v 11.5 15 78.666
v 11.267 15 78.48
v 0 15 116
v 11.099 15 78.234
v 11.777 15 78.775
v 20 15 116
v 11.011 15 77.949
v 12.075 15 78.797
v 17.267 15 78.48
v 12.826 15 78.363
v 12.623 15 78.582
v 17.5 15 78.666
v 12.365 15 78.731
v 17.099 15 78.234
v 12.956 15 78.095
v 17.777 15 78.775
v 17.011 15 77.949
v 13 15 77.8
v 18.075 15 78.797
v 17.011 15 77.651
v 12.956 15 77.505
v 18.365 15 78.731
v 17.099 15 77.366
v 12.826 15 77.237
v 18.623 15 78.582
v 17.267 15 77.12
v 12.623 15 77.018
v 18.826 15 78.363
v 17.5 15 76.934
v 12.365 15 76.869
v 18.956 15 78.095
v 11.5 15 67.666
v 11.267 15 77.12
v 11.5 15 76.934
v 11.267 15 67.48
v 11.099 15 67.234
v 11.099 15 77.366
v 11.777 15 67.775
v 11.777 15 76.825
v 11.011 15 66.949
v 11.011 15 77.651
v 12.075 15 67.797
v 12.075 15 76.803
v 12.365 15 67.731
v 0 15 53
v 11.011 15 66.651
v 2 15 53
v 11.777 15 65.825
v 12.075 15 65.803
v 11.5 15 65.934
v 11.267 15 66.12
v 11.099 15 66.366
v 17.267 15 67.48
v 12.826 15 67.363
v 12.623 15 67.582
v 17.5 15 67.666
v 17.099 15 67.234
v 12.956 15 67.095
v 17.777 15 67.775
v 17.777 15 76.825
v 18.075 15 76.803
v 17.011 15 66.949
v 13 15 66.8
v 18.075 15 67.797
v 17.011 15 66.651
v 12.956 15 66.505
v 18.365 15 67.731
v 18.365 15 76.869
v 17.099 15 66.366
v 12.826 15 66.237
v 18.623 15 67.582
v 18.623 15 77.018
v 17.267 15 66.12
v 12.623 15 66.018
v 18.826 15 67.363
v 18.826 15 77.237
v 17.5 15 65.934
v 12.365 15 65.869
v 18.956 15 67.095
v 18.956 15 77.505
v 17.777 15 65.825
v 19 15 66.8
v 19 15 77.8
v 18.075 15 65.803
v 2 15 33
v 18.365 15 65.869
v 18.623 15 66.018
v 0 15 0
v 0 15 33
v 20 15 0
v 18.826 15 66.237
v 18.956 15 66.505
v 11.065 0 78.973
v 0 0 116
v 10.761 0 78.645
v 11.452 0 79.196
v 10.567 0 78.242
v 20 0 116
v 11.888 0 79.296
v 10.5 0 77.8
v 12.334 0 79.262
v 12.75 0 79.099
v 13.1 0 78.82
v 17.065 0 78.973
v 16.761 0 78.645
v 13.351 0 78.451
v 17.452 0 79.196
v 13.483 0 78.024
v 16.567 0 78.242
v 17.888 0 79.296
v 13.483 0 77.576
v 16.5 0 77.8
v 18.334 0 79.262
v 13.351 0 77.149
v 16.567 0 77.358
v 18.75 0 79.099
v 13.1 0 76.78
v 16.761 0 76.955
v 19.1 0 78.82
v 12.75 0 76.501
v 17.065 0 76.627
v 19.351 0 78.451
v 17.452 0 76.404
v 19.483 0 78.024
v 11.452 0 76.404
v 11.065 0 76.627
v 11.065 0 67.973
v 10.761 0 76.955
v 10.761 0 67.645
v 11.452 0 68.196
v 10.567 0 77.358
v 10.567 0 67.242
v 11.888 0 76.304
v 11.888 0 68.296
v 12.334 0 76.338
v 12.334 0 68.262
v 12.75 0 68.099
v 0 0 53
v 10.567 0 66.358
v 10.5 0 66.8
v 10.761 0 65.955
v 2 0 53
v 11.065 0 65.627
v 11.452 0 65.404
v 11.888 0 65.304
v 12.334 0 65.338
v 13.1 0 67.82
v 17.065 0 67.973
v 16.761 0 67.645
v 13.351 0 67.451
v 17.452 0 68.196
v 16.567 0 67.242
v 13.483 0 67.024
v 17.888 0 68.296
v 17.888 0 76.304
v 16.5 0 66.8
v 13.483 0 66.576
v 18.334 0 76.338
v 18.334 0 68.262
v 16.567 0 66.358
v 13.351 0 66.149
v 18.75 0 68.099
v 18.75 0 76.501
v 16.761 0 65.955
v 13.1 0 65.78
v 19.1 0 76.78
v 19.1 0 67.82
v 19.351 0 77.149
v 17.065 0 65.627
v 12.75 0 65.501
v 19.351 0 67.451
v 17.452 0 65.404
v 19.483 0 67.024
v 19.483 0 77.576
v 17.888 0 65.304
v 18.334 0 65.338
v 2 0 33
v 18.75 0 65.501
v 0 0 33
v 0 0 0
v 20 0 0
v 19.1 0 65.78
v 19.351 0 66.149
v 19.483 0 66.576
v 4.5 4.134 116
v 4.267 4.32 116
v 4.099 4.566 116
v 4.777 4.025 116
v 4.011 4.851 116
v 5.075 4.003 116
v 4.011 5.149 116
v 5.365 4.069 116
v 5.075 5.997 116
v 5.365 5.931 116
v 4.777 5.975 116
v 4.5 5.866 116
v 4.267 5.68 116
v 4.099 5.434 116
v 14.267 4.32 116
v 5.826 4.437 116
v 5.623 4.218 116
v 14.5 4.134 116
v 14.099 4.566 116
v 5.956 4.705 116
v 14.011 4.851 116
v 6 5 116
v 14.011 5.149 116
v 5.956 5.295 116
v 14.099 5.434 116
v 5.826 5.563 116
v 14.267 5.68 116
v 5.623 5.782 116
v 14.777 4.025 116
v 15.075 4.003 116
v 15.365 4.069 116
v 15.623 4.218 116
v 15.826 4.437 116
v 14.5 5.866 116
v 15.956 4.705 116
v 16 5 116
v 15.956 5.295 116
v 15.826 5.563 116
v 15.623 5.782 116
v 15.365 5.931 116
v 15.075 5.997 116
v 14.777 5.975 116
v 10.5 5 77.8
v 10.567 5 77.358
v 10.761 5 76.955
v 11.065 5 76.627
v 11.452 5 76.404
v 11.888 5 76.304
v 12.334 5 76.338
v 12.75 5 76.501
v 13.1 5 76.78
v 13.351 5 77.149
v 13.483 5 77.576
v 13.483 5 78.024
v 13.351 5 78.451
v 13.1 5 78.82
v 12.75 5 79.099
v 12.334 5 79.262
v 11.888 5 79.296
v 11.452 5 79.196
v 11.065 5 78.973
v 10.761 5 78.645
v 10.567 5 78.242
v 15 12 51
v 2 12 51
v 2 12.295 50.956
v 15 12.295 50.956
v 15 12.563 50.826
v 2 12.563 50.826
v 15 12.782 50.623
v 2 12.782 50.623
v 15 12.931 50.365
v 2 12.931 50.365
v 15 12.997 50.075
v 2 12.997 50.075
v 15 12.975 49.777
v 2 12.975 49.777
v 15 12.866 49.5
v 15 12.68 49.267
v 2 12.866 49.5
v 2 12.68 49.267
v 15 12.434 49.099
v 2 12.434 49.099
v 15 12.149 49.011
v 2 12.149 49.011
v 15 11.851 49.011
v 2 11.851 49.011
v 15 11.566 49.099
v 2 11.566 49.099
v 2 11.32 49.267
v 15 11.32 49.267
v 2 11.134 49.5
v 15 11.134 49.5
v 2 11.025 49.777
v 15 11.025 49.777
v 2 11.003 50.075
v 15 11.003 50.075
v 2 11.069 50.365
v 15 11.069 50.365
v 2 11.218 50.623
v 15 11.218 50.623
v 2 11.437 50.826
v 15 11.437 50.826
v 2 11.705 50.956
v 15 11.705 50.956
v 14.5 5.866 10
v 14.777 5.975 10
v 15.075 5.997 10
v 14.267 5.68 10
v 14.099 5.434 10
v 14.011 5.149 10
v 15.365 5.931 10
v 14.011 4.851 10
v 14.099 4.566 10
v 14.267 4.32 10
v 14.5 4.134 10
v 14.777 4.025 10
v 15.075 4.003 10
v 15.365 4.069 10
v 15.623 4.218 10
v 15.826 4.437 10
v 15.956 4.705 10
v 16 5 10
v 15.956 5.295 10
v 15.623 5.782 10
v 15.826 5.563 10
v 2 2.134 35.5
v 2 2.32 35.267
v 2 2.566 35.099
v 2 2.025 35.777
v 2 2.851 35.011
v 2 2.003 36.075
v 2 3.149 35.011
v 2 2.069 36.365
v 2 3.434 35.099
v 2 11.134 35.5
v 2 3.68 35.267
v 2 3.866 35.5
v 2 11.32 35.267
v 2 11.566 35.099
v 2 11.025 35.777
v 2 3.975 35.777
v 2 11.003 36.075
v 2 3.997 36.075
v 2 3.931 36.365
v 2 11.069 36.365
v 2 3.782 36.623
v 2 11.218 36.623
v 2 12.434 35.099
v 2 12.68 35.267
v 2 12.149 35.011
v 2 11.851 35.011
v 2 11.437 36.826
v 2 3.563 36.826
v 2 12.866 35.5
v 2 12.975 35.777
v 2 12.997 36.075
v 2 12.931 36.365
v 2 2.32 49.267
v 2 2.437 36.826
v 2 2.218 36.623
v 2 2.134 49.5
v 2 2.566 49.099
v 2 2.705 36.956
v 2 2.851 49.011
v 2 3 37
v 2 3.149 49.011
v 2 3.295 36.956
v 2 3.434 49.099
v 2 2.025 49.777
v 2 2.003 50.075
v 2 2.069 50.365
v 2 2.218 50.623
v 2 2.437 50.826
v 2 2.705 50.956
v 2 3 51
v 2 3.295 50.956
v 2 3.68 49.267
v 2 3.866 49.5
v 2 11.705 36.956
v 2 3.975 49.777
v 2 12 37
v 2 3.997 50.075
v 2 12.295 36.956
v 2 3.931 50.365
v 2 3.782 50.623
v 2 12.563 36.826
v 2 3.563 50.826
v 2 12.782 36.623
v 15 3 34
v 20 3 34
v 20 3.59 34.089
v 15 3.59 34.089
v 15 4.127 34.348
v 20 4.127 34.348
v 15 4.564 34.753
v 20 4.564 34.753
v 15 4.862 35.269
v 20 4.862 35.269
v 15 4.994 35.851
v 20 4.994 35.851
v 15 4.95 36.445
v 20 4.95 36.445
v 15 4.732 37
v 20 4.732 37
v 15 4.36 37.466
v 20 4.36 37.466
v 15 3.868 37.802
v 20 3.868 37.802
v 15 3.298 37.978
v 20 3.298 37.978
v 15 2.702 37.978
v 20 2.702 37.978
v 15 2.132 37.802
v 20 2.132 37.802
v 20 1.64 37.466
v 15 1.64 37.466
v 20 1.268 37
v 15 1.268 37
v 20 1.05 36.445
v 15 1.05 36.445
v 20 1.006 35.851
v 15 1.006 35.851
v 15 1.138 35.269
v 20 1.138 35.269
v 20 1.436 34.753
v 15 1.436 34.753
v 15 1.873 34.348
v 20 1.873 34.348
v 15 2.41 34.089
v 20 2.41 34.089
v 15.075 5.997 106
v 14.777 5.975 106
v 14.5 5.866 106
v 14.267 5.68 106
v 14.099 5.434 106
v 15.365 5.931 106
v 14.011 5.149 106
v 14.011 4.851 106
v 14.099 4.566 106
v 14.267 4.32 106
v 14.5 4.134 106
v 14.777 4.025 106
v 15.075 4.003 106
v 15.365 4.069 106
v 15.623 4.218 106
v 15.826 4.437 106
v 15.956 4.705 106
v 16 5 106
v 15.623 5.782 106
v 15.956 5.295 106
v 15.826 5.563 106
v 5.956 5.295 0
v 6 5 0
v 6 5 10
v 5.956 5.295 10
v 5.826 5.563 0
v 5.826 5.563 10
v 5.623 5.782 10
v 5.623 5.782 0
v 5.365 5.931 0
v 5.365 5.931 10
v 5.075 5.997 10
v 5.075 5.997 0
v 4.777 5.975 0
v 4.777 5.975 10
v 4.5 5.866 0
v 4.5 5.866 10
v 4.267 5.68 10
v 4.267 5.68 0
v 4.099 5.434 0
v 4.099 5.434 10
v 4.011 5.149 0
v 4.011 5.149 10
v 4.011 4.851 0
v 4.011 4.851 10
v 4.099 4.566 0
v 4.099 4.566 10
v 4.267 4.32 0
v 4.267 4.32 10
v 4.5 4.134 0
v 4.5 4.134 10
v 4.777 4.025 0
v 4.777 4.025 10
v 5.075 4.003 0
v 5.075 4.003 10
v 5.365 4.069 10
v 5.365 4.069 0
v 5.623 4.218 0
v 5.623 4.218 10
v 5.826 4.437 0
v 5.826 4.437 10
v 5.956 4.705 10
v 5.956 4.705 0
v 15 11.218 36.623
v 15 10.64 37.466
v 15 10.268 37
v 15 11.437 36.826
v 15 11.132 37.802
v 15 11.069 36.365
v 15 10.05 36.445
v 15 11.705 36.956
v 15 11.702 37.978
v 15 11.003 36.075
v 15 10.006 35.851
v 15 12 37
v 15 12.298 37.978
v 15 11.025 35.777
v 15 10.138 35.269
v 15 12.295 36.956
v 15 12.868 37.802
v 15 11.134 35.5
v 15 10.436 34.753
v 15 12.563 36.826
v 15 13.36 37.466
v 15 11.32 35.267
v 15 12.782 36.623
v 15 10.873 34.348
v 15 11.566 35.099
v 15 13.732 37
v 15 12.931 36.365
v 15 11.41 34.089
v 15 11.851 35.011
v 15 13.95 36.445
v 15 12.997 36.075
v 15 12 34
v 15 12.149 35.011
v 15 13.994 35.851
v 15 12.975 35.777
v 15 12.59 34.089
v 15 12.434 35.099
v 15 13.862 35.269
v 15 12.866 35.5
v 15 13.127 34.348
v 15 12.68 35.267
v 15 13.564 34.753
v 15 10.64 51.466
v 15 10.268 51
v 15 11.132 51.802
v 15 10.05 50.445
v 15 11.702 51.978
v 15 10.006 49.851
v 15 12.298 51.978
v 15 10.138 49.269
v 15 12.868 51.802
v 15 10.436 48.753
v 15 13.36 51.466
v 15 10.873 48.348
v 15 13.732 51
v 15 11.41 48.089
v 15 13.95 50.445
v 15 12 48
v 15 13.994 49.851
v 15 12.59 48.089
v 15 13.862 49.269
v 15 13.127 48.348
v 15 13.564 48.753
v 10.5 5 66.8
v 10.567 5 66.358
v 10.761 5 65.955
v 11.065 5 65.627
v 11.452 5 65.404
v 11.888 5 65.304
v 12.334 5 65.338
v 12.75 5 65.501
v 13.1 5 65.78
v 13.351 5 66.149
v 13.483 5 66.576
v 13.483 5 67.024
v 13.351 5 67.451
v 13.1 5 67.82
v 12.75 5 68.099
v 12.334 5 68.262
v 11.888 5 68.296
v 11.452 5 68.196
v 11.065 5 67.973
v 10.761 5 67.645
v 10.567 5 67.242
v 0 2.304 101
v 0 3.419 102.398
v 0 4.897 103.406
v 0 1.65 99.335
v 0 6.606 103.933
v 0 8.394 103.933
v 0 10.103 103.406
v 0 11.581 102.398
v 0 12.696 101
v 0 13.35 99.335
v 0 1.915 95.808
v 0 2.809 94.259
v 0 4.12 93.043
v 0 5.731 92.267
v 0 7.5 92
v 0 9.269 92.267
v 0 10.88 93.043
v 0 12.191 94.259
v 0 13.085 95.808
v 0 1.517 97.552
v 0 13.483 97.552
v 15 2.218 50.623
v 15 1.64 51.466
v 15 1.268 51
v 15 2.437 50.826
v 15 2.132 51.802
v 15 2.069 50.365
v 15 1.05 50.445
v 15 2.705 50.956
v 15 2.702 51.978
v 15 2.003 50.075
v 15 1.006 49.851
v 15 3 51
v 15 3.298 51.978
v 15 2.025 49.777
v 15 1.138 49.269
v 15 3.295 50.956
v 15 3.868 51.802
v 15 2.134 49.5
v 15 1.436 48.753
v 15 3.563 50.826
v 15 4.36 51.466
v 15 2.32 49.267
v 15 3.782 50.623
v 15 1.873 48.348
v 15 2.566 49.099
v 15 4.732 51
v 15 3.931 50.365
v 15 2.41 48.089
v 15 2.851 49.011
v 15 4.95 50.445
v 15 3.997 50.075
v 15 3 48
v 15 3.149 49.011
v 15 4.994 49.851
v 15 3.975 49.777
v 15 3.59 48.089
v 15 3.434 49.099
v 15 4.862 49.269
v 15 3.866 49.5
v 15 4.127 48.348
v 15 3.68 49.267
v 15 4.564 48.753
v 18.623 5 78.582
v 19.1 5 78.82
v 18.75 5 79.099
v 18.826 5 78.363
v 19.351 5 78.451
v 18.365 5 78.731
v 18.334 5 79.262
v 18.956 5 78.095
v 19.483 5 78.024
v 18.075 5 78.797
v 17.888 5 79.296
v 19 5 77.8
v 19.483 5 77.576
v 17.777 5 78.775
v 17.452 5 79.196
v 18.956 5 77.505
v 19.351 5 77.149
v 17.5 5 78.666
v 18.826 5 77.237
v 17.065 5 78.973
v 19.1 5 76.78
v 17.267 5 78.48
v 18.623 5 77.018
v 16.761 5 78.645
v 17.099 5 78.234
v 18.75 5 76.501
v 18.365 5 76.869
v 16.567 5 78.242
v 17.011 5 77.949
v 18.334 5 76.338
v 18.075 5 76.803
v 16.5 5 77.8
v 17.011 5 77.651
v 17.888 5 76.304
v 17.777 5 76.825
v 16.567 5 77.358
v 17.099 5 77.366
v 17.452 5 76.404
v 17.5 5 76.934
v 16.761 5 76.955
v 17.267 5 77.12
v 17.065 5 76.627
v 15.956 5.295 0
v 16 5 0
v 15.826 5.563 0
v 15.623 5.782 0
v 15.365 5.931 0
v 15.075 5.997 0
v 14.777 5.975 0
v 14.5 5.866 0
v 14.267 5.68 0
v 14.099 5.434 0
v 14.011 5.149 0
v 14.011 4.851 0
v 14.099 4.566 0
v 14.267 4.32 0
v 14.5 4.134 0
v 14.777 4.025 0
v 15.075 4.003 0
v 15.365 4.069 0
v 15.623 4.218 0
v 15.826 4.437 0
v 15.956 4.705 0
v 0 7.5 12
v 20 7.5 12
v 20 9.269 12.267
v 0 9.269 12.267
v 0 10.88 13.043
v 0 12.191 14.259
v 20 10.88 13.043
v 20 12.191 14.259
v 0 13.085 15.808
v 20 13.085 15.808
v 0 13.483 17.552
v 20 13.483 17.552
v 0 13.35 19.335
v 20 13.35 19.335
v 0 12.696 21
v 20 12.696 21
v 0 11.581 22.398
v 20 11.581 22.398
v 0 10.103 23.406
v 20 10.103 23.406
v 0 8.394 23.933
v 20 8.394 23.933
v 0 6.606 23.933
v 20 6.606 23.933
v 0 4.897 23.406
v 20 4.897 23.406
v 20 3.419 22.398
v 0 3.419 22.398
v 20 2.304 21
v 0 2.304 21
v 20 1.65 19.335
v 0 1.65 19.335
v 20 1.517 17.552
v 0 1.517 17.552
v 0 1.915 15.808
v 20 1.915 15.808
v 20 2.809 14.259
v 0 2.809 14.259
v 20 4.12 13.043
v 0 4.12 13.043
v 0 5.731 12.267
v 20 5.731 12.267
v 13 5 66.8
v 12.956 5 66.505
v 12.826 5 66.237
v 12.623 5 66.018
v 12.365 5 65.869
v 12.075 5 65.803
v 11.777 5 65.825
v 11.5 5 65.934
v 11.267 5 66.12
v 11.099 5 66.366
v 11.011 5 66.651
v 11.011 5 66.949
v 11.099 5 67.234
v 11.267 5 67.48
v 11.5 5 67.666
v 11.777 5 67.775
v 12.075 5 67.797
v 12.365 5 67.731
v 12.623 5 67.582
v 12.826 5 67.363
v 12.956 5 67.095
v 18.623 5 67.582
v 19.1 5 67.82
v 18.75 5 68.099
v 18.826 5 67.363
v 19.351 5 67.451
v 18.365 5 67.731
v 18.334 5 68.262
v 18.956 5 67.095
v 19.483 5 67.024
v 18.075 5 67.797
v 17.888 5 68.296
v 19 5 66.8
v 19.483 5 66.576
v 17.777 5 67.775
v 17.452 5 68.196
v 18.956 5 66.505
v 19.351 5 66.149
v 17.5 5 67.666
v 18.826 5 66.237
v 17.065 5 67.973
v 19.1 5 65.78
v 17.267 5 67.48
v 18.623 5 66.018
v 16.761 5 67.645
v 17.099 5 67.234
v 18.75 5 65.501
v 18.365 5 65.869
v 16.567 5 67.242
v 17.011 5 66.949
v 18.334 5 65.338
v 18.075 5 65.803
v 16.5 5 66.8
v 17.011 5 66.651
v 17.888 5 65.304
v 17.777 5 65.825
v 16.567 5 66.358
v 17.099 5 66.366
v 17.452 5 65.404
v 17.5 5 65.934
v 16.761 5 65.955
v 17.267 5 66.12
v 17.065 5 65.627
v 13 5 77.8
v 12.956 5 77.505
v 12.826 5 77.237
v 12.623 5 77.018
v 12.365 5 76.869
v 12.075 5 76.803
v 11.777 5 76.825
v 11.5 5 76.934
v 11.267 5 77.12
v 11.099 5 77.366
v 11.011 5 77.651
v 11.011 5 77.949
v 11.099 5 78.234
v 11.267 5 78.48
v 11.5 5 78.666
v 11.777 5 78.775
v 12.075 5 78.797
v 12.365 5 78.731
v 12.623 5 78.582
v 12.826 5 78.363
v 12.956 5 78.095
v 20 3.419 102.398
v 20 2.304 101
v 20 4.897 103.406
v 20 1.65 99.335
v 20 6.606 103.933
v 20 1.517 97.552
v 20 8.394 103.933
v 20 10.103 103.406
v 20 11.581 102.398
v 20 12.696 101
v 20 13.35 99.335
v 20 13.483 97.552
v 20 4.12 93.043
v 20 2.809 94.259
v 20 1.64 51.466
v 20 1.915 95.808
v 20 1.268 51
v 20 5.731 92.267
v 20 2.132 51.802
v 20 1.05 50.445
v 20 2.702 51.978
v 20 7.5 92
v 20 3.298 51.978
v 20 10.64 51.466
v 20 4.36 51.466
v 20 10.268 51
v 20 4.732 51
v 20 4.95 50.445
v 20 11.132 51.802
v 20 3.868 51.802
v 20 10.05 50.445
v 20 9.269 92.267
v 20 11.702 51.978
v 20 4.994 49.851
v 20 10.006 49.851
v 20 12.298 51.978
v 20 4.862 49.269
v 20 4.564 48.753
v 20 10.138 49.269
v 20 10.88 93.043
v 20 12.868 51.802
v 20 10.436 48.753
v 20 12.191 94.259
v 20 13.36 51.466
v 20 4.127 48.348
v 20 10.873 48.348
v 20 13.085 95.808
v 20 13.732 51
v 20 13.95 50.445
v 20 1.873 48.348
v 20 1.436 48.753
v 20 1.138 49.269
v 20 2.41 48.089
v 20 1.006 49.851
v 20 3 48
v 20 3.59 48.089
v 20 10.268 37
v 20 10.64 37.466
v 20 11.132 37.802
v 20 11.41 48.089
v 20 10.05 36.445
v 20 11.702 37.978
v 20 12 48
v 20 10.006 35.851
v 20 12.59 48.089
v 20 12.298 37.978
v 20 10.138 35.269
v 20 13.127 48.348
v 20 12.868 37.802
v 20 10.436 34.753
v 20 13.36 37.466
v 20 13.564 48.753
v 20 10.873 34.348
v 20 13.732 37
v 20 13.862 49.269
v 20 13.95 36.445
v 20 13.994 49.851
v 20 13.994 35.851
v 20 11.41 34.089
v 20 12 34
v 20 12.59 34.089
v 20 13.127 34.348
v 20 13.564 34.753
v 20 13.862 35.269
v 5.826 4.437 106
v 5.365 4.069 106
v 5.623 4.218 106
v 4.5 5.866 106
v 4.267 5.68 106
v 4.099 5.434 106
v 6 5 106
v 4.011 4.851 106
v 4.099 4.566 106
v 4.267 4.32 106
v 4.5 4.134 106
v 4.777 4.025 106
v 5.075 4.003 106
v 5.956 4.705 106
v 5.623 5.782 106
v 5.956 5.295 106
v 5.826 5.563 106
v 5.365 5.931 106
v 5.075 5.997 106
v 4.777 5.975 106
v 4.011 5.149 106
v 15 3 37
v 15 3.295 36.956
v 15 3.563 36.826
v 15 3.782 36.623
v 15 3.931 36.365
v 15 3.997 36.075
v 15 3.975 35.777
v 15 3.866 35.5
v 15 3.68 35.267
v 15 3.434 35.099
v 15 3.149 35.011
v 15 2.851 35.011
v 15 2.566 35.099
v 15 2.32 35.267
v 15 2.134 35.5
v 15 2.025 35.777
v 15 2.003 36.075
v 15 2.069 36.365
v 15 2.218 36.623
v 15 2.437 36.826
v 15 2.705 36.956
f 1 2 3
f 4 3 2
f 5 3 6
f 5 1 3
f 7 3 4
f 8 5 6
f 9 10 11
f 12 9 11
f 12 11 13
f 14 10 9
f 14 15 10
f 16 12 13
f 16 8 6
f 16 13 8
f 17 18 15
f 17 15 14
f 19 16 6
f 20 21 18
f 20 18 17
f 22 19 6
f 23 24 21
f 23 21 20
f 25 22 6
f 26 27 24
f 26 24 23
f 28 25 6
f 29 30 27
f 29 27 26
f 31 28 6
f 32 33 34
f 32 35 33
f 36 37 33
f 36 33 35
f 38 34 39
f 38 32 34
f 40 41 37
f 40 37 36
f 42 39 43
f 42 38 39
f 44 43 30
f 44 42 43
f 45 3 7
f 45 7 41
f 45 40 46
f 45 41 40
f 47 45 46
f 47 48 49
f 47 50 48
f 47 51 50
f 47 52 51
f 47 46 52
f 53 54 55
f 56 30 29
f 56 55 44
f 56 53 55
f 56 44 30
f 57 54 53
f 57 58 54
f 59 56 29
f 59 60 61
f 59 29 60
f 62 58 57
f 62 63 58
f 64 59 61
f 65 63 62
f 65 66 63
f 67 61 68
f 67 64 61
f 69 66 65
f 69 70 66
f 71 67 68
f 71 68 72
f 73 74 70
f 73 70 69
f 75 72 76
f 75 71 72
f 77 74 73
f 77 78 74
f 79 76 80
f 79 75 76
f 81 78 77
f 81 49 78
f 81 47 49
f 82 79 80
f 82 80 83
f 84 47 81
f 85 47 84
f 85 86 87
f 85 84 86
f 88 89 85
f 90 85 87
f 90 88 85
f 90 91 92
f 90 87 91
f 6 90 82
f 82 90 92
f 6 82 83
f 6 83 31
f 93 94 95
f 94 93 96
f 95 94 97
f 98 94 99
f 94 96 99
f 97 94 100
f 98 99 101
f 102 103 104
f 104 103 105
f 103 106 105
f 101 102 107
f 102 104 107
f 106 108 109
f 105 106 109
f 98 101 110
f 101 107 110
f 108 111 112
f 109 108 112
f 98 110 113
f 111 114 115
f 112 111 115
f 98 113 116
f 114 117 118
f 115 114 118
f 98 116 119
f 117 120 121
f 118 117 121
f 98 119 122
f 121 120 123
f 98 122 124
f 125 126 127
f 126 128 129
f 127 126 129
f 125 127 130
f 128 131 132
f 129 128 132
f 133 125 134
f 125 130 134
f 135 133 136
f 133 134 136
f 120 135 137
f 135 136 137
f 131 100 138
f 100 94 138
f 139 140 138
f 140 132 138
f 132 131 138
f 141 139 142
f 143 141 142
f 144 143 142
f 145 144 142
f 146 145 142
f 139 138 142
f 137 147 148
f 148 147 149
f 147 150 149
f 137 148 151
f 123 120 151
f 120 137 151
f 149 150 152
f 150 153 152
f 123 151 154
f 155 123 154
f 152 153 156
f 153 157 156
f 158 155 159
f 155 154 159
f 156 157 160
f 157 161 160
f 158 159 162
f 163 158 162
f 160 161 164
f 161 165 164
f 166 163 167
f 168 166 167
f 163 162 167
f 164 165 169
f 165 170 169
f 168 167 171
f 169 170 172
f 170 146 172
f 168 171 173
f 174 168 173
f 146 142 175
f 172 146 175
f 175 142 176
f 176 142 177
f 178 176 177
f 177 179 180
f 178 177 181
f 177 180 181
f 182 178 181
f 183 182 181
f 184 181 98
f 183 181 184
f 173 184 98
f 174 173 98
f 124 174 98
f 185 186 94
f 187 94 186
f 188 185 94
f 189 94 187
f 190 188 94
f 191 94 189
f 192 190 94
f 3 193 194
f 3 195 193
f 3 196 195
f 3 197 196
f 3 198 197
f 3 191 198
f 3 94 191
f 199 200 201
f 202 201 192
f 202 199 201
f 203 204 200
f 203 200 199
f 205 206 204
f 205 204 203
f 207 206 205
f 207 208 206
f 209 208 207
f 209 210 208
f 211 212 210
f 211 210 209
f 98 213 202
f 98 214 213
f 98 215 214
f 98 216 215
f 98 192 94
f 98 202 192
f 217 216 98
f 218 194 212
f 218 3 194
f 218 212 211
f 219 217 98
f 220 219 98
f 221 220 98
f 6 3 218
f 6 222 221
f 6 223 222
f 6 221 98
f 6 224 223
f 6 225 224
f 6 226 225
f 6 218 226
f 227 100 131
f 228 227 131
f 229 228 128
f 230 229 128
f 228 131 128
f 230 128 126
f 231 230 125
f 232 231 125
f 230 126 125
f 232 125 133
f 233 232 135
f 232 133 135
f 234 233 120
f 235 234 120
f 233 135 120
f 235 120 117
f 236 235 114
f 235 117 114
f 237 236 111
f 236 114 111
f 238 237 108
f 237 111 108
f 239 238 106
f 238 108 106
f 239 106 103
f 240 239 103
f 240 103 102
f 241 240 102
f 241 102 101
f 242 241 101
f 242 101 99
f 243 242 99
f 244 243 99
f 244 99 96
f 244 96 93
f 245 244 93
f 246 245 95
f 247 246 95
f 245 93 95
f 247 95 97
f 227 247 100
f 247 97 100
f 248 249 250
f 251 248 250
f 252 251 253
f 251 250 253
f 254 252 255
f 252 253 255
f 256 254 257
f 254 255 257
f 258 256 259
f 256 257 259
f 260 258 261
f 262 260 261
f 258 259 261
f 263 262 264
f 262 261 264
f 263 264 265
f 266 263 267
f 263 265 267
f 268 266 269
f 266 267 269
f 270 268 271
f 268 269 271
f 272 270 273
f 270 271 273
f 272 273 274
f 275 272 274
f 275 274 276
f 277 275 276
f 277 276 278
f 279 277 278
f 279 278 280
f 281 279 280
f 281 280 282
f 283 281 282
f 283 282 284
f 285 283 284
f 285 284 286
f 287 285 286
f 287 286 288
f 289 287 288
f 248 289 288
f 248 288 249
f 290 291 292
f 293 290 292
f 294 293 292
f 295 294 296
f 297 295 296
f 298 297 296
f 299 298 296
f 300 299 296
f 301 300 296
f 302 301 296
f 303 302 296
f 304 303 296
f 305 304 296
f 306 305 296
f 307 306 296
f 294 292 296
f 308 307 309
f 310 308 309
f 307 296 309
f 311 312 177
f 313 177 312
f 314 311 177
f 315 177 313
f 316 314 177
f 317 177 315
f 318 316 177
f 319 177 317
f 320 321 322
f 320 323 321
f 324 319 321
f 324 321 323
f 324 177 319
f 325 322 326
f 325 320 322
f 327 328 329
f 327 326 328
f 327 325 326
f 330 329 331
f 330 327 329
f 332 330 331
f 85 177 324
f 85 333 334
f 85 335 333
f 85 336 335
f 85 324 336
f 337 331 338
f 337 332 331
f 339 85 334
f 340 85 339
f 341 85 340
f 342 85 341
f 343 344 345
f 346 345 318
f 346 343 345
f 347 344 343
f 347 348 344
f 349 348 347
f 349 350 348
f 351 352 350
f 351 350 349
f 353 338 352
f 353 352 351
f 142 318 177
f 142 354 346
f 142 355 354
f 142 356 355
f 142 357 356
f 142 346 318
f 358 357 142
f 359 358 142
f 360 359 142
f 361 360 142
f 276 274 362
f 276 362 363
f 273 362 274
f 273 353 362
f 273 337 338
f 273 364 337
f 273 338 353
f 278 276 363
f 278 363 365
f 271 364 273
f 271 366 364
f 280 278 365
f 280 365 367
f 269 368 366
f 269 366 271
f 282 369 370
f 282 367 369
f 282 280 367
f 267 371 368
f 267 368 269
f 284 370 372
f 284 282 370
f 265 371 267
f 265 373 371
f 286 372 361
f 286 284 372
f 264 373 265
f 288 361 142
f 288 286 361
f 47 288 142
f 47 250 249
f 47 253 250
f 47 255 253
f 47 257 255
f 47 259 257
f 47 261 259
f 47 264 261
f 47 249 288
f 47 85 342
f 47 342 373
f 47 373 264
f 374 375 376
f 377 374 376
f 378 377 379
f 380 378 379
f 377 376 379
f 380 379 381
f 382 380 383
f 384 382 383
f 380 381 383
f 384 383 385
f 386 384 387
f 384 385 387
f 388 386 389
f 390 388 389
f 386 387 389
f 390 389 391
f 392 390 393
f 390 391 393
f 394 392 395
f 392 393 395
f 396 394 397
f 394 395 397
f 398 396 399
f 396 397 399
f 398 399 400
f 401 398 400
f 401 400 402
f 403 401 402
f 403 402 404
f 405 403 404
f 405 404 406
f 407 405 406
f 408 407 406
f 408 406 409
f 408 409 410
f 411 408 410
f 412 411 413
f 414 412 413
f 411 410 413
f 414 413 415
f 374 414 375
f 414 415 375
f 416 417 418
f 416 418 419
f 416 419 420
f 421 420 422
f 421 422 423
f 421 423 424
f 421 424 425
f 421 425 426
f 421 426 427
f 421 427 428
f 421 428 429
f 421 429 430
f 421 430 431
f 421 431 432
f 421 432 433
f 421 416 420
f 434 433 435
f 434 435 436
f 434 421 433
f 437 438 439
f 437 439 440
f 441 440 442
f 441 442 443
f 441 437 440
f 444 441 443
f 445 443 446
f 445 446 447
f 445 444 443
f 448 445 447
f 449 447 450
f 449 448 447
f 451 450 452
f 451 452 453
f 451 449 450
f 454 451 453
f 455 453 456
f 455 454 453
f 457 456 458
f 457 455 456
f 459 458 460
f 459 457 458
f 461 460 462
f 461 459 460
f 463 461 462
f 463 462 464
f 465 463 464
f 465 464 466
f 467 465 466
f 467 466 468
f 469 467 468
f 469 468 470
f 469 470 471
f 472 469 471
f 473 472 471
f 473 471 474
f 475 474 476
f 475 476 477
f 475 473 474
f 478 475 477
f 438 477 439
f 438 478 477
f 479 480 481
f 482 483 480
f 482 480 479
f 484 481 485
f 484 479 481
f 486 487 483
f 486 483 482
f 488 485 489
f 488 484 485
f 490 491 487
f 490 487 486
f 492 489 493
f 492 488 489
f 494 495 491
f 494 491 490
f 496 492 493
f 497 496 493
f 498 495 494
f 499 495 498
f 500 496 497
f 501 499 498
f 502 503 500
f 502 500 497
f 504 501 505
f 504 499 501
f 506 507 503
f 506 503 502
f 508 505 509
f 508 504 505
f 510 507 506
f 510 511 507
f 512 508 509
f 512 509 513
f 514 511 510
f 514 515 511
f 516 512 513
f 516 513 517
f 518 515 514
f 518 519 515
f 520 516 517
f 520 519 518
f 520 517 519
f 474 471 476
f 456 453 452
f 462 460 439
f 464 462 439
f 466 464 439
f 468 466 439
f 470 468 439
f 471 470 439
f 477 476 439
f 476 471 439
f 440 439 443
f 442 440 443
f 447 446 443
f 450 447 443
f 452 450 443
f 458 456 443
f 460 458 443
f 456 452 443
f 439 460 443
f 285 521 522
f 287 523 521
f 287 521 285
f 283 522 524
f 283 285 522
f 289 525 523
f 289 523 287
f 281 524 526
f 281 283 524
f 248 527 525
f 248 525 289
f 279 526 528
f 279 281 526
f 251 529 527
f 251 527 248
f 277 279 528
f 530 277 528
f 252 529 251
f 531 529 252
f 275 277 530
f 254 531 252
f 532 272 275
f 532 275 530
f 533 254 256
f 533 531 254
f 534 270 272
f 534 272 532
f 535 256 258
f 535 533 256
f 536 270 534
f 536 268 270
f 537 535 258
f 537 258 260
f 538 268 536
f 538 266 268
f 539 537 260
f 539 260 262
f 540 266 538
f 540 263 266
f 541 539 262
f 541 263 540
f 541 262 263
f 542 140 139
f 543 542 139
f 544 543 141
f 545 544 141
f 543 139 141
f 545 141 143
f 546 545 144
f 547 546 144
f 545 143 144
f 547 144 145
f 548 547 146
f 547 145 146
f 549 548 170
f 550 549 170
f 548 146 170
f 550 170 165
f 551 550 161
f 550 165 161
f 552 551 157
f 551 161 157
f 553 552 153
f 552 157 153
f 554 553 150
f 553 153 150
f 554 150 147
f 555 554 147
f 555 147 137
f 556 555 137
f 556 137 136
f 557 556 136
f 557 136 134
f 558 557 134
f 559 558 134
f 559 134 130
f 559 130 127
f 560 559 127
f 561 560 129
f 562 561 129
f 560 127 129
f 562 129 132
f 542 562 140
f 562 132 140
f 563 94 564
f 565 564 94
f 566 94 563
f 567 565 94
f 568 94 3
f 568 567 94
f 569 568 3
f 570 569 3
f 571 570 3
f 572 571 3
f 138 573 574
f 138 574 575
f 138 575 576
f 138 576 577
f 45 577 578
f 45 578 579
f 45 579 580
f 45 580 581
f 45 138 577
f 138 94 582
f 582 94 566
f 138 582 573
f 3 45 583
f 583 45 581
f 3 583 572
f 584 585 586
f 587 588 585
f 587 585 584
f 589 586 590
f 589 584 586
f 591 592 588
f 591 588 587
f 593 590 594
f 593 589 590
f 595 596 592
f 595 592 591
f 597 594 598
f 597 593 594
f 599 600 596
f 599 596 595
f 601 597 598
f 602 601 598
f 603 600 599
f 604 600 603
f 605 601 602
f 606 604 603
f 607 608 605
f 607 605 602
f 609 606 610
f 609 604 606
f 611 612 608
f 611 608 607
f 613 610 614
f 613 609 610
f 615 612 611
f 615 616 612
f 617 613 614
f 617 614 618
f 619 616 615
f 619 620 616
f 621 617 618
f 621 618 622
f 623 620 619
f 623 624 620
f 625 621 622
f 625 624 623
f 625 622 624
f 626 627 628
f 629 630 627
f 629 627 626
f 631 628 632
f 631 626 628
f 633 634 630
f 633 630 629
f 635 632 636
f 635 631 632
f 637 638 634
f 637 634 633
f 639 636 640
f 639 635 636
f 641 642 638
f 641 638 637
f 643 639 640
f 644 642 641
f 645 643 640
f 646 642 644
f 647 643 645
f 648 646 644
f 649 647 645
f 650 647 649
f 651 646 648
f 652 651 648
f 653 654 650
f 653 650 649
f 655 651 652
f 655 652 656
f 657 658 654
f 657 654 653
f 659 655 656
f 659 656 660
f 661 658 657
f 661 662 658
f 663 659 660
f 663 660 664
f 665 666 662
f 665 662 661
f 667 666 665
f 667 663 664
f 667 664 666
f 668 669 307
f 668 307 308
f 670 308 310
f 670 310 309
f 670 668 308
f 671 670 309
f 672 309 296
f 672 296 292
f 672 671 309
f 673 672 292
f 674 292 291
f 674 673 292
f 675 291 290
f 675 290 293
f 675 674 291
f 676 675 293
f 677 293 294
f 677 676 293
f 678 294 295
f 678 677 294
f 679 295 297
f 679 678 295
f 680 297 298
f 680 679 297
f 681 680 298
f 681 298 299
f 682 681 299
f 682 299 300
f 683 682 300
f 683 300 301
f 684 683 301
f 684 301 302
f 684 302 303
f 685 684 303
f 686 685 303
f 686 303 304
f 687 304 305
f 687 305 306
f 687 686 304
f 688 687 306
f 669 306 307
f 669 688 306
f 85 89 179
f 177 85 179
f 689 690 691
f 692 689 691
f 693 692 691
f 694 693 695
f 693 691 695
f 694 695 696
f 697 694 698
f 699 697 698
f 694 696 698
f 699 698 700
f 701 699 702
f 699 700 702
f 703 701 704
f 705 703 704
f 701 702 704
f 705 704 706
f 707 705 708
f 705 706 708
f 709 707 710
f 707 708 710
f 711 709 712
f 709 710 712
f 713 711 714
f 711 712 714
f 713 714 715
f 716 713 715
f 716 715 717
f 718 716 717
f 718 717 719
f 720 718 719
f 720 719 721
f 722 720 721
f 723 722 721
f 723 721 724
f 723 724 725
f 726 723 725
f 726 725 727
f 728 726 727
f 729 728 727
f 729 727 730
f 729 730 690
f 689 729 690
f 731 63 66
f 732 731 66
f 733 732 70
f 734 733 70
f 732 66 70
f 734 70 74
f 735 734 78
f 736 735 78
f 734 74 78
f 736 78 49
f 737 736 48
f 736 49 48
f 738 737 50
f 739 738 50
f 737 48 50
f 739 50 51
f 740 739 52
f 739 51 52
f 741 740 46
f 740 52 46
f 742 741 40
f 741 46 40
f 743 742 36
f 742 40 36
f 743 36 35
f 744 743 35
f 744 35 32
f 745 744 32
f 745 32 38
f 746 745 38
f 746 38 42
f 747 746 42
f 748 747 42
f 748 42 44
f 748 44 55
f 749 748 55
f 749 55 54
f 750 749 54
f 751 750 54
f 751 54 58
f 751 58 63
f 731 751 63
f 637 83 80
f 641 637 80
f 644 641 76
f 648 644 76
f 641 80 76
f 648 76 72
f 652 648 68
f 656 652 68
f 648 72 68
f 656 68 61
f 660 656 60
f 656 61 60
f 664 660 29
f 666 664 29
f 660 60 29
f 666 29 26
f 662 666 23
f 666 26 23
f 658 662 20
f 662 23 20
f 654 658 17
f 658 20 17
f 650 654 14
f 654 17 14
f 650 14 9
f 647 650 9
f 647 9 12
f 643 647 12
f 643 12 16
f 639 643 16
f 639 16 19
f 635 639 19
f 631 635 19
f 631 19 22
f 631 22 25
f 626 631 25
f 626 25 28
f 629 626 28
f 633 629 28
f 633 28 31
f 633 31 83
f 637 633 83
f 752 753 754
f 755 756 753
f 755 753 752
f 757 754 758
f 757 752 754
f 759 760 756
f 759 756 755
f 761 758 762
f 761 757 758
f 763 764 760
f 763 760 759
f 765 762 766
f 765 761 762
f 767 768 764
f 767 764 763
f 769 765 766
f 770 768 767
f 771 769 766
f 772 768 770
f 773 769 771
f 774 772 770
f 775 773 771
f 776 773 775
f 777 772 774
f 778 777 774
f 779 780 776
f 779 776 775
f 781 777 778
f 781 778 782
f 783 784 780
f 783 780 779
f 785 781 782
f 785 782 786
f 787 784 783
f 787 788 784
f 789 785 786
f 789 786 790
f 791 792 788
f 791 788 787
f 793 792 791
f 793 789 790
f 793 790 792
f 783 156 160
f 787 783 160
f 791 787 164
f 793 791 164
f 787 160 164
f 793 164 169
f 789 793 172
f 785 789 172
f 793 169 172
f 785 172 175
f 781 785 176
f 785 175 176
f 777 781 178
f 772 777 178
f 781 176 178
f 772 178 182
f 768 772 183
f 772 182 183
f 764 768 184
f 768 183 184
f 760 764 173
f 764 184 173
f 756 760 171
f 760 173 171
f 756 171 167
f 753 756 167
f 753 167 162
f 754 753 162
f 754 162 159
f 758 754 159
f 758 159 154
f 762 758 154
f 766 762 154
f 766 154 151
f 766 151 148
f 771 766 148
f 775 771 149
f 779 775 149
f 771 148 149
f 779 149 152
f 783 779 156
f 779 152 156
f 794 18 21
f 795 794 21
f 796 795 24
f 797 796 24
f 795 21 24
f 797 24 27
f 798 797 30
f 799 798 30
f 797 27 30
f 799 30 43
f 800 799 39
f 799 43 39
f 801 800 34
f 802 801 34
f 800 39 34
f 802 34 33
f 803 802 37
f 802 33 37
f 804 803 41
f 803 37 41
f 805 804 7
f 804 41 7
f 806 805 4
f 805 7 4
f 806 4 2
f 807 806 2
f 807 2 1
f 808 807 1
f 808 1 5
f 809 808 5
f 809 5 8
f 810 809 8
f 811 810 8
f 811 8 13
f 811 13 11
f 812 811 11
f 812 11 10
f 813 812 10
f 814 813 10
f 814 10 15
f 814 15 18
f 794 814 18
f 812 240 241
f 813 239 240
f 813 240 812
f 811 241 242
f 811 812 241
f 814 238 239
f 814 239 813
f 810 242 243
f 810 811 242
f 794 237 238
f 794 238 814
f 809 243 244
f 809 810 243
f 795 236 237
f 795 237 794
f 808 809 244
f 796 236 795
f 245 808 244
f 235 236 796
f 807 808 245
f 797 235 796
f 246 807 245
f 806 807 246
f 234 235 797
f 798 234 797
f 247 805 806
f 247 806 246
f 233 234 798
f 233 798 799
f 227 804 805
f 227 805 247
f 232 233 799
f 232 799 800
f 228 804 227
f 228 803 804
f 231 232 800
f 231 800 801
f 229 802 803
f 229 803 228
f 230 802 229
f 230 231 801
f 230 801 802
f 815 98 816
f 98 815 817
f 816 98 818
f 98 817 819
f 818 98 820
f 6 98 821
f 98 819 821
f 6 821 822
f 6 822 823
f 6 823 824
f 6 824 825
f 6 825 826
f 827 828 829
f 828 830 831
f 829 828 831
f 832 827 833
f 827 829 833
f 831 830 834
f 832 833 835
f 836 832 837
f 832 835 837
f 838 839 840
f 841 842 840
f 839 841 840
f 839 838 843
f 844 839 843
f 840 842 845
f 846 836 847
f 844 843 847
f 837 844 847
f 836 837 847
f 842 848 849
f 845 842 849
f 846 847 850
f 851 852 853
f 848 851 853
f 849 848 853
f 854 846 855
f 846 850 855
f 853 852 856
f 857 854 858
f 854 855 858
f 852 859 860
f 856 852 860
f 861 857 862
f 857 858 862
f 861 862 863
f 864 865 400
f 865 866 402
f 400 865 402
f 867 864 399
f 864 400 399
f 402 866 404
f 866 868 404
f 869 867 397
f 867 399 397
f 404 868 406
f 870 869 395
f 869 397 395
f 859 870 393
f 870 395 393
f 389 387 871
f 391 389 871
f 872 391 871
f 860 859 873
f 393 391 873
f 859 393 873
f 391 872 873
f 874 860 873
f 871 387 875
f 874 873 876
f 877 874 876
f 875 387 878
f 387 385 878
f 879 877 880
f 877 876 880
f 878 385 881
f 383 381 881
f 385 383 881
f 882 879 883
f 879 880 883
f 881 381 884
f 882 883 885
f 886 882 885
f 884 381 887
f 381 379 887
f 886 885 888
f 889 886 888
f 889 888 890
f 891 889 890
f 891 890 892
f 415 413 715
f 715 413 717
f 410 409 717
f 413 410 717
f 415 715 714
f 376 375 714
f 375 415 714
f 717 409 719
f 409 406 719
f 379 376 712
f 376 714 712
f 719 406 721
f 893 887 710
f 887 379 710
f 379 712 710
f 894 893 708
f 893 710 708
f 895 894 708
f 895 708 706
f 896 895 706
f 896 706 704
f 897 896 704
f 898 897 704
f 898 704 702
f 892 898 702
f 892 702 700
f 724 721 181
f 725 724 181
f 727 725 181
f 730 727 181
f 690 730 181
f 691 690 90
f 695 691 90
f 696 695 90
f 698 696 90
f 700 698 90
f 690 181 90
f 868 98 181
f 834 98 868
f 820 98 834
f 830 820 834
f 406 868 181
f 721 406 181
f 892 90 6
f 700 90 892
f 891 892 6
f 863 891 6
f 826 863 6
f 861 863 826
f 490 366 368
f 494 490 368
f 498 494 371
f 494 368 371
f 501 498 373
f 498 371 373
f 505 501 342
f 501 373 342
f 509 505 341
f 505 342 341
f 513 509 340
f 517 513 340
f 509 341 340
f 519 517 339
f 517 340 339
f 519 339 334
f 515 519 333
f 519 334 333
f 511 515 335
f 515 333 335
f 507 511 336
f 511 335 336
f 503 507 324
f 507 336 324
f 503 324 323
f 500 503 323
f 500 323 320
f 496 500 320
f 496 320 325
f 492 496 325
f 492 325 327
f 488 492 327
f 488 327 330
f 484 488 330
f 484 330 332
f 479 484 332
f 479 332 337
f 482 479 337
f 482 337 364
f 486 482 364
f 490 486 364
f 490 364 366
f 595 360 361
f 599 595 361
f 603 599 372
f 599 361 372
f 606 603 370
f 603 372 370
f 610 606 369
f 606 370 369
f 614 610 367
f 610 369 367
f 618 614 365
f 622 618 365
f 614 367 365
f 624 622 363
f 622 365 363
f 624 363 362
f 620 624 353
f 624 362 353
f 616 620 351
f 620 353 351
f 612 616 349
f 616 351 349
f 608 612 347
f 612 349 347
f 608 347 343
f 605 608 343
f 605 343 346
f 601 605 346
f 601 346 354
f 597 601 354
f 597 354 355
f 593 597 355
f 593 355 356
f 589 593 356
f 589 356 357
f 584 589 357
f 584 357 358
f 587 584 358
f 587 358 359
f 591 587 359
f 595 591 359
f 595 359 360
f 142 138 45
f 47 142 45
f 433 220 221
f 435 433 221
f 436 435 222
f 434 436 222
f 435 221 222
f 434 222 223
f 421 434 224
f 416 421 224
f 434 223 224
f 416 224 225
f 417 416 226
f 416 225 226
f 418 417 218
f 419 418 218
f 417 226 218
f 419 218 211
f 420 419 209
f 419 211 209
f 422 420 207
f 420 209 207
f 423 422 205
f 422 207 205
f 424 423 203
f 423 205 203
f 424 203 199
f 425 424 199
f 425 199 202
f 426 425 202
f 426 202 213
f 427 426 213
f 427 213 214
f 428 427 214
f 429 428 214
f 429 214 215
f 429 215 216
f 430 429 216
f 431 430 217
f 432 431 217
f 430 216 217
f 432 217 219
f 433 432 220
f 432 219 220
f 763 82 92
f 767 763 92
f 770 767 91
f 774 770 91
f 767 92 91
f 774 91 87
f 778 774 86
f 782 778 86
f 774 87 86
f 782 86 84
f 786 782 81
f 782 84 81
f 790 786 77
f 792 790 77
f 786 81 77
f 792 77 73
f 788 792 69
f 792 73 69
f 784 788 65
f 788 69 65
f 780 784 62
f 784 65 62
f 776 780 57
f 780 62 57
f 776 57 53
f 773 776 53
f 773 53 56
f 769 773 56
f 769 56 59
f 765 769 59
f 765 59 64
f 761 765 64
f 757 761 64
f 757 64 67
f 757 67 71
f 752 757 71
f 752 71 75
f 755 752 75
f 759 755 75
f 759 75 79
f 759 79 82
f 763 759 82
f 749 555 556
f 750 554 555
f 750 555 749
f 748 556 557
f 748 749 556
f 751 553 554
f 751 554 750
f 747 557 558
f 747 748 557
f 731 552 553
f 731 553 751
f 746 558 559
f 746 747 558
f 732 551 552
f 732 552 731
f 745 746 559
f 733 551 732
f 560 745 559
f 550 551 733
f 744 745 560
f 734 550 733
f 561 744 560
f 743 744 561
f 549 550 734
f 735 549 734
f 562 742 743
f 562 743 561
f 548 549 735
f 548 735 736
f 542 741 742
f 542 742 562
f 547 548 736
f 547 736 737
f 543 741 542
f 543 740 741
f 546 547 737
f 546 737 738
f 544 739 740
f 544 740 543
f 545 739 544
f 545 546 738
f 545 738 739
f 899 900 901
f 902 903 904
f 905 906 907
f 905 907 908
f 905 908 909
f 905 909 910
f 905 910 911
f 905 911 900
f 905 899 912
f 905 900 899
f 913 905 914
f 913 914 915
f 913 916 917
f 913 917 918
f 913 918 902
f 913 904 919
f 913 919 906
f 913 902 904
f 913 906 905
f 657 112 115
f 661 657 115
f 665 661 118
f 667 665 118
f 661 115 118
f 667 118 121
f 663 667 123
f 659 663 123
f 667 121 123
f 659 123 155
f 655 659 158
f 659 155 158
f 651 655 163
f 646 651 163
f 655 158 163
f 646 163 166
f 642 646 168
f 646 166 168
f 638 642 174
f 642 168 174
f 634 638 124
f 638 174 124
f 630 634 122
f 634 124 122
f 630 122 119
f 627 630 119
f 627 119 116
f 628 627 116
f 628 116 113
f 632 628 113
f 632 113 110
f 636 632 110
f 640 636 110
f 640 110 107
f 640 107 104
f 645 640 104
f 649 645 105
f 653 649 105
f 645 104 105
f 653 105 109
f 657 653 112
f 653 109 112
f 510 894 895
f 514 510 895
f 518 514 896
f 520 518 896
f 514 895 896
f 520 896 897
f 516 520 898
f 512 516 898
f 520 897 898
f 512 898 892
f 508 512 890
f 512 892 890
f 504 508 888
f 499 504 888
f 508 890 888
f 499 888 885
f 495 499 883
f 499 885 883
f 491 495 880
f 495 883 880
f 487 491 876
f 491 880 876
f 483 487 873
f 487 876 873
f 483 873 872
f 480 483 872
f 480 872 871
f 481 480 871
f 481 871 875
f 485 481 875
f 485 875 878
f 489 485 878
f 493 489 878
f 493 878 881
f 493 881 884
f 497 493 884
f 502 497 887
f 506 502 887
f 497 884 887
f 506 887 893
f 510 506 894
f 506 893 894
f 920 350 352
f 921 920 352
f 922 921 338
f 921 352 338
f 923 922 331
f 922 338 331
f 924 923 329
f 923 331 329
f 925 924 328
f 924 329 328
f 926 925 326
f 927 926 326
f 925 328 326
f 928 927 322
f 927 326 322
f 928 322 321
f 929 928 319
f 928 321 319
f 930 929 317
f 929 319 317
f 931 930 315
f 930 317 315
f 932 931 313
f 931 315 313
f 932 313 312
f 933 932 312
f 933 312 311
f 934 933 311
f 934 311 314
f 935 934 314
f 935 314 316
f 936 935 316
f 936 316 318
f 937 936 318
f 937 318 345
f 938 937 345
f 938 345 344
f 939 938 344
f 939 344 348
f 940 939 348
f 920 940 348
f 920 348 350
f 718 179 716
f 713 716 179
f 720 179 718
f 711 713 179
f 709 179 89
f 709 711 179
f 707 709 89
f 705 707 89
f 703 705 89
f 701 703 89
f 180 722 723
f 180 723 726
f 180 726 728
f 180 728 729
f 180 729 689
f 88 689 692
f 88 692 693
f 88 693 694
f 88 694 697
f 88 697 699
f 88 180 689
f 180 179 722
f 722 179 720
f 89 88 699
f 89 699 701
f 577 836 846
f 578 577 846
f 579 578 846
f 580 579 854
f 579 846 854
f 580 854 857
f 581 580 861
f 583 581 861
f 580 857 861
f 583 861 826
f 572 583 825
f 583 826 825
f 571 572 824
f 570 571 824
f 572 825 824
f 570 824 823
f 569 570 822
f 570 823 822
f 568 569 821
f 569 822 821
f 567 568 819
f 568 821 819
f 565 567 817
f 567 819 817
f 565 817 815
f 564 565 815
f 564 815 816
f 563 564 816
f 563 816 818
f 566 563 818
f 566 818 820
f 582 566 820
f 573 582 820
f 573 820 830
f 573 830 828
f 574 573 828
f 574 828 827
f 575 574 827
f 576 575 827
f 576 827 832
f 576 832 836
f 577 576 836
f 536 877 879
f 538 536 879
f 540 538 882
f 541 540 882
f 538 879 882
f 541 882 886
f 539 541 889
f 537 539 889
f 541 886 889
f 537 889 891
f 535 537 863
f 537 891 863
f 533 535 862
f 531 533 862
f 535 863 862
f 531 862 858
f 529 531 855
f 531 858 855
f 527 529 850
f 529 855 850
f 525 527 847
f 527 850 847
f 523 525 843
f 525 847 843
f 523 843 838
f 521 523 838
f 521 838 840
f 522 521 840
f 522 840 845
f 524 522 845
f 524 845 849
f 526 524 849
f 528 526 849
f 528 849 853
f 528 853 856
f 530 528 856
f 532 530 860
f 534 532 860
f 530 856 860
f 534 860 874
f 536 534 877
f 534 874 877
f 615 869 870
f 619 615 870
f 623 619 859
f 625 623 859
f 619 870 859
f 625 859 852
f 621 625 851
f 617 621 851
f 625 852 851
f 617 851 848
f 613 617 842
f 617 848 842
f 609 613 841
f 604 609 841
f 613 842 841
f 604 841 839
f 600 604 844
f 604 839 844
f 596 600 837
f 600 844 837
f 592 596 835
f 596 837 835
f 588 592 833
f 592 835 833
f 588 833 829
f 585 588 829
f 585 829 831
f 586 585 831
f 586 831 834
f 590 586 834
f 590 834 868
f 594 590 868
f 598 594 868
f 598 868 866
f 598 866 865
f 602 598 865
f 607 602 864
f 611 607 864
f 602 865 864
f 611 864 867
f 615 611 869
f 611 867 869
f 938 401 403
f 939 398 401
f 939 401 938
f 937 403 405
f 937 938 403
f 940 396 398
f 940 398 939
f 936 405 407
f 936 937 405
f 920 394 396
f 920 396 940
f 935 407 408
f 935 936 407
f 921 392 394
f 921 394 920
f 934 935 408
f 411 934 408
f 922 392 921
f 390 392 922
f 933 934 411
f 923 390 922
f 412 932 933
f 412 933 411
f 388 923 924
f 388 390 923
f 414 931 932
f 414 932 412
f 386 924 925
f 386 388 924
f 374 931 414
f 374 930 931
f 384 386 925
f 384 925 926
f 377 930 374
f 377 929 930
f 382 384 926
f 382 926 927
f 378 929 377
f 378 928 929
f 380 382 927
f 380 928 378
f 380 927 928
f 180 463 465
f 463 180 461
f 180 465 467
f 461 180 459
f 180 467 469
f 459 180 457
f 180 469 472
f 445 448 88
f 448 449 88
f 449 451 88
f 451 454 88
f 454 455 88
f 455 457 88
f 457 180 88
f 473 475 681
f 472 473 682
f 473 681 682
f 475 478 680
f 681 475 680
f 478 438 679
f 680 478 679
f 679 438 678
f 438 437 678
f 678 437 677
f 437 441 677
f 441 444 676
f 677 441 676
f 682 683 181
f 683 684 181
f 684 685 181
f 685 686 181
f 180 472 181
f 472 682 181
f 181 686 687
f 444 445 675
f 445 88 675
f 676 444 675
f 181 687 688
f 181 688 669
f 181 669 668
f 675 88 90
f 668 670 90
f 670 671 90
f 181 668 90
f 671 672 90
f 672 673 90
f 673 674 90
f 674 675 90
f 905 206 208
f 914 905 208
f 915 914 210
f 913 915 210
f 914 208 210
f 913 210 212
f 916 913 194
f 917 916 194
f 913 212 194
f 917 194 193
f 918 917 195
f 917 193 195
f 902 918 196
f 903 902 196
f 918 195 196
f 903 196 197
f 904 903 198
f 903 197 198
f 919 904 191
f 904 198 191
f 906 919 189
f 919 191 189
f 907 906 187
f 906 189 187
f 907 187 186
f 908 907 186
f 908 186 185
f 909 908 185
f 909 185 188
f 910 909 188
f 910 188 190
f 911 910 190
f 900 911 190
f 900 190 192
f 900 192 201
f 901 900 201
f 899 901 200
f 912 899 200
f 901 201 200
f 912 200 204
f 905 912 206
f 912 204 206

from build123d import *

# Parameters (mm, degrees)
SKETCH1_W           = 20
SKETCH1_H           = 15
BOSS_EXTRUDE1_DEPTH = 116
SKETCH1_5_R         = 1
CUT_EXTRUDE1_DEPTH  = 10
CUT_EXTRUDE2_START  = -10
SKETCH4_R           = 1
CUT_EXTRUDE2_DEPTH  = 10
SKETCH5_R           = 2.5
CUT_EXTRUDE3_DEPTH  = 119.663389468
SKETCH6_R           = 6
CUT_EXTRUDE4_DEPTH  = 119.663389468
SKETCH8_R           = 1
CUT_EXTRUDE5_DEPTH  = 119.663389468
SKETCH9_R           = 1.5
CUT_EXTRUDE6_DEPTH  = 5
SKETCH10_R          = 1
CUT_EXTRUDE7_DEPTH  = 119.663389468
SKETCH11_R          = 2
CUT_EXTRUDE8_DEPTH  = 5
SKETCH10_3_W        = 20
SKETCH10_3_H        = 15
SKETCH10_3_R        = 1
CUT_EXTRUDE9_DEPTH  = 2


with BuildPart() as part:
    # Sketch1 → Boss-Extrude1 (new body)
    with BuildSketch(Plane.XY):
        with Locations((10, 7.5)):
            Rectangle(SKETCH1_W, SKETCH1_H)
    extrude(amount=BOSS_EXTRUDE1_DEPTH)

    # Sketch1<5> → Cut-Extrude1 (cut)
    with BuildSketch(Plane.XY):
        with Locations((15, 5)):
            Circle(SKETCH1_5_R)
        with Locations((5, 5)):
            Circle(SKETCH1_5_R)
    extrude(amount=CUT_EXTRUDE1_DEPTH, mode=Mode.SUBTRACT)

    # Sketch4 → Cut-Extrude2 (cut)
    with BuildSketch(Plane.XY.offset(116).offset(CUT_EXTRUDE2_START)):
        with Locations((5, 5)):
            Circle(SKETCH4_R)
        with Locations((15, 5)):
            Circle(SKETCH4_R)
    extrude(amount=CUT_EXTRUDE2_DEPTH, mode=Mode.SUBTRACT)

    # Sketch5 → Cut-Extrude3 (cut, through all)
    with BuildSketch(Plane(origin=(20, 0, 0), x_dir=(0, 0, -1), z_dir=(1, 0, 0))):
        with Locations((-98, 7.5)):
            Circle(SKETCH5_R)
        with Locations((-18, 7.5)):
            Circle(SKETCH5_R)
    extrude(amount=-CUT_EXTRUDE3_DEPTH, mode=Mode.SUBTRACT)

    # Sketch6 → Cut-Extrude4 (cut, through all)
    with BuildSketch(Plane(origin=(20, 0, 0), x_dir=(0, 0, -1), z_dir=(1, 0, 0))):
        with Locations((-98, 7.5)):
            Circle(SKETCH6_R)
        with Locations((-18, 7.5)):
            Circle(SKETCH6_R)
    extrude(amount=-CUT_EXTRUDE4_DEPTH, mode=Mode.SUBTRACT)

    # Sketch8 → Cut-Extrude5 (cut, through all)
    with BuildSketch(Plane(origin=(0, 15, 0), x_dir=(1, 0, 0), z_dir=(0, 1, 0))):
        with Locations((12, -66.8)):
            Circle(SKETCH8_R)
        with Locations((18, -66.8)):
            Circle(SKETCH8_R)
        with Locations((18, -77.8)):
            Circle(SKETCH8_R)
        with Locations((12, -77.8)):
            Circle(SKETCH8_R)
    extrude(amount=-CUT_EXTRUDE5_DEPTH, mode=Mode.SUBTRACT)

    # Sketch9 → Cut-Extrude6 (cut)
    with BuildSketch(Plane(origin=(0, 0, 0), x_dir=(-1, 0, 0), z_dir=(0, -1, 0))):
        with Locations((-18, -66.8)):
            Circle(SKETCH9_R)
        with Locations((-18, -77.8)):
            Circle(SKETCH9_R)
        with Locations((-12, -77.8)):
            Circle(SKETCH9_R)
        with Locations((-12, -66.8)):
            Circle(SKETCH9_R)
    extrude(amount=-CUT_EXTRUDE6_DEPTH, mode=Mode.SUBTRACT)

    # Sketch10 → Cut-Extrude7 (cut, through all)
    with BuildSketch(Plane.ZY):
        with Locations((36, 12)):
            Circle(SKETCH10_R)
        with Locations((50, 12)):
            Circle(SKETCH10_R)
        with Locations((50, 3)):
            Circle(SKETCH10_R)
        with Locations((36, 3)):
            Circle(SKETCH10_R)
    extrude(amount=-CUT_EXTRUDE7_DEPTH, mode=Mode.SUBTRACT)

    # Sketch11 → Cut-Extrude8 (cut)
    with BuildSketch(Plane(origin=(20, 0, 0), x_dir=(0, 0, -1), z_dir=(1, 0, 0))):
        with Locations((-36, 12)):
            Circle(SKETCH11_R)
        with Locations((-36, 3)):
            Circle(SKETCH11_R)
        with Locations((-50, 3)):
            Circle(SKETCH11_R)
        with Locations((-50, 12)):
            Circle(SKETCH11_R)
    extrude(amount=-CUT_EXTRUDE8_DEPTH, mode=Mode.SUBTRACT)

    # Sketch10<3> → Cut-Extrude9 (cut)
    with BuildSketch(Plane.ZY):
        with Locations((43, 7.5)):
            Rectangle(SKETCH10_3_W, SKETCH10_3_H)
        with Locations((36, 3)):
            Circle(SKETCH10_3_R, mode=Mode.SUBTRACT)
        with Locations((36, 12)):
            Circle(SKETCH10_3_R, mode=Mode.SUBTRACT)
        with Locations((50, 3)):
            Circle(SKETCH10_3_R, mode=Mode.SUBTRACT)
        with Locations((50, 12)):
            Circle(SKETCH10_3_R, mode=Mode.SUBTRACT)
    extrude(amount=-CUT_EXTRUDE9_DEPTH, mode=Mode.SUBTRACT)


solid = part.part
